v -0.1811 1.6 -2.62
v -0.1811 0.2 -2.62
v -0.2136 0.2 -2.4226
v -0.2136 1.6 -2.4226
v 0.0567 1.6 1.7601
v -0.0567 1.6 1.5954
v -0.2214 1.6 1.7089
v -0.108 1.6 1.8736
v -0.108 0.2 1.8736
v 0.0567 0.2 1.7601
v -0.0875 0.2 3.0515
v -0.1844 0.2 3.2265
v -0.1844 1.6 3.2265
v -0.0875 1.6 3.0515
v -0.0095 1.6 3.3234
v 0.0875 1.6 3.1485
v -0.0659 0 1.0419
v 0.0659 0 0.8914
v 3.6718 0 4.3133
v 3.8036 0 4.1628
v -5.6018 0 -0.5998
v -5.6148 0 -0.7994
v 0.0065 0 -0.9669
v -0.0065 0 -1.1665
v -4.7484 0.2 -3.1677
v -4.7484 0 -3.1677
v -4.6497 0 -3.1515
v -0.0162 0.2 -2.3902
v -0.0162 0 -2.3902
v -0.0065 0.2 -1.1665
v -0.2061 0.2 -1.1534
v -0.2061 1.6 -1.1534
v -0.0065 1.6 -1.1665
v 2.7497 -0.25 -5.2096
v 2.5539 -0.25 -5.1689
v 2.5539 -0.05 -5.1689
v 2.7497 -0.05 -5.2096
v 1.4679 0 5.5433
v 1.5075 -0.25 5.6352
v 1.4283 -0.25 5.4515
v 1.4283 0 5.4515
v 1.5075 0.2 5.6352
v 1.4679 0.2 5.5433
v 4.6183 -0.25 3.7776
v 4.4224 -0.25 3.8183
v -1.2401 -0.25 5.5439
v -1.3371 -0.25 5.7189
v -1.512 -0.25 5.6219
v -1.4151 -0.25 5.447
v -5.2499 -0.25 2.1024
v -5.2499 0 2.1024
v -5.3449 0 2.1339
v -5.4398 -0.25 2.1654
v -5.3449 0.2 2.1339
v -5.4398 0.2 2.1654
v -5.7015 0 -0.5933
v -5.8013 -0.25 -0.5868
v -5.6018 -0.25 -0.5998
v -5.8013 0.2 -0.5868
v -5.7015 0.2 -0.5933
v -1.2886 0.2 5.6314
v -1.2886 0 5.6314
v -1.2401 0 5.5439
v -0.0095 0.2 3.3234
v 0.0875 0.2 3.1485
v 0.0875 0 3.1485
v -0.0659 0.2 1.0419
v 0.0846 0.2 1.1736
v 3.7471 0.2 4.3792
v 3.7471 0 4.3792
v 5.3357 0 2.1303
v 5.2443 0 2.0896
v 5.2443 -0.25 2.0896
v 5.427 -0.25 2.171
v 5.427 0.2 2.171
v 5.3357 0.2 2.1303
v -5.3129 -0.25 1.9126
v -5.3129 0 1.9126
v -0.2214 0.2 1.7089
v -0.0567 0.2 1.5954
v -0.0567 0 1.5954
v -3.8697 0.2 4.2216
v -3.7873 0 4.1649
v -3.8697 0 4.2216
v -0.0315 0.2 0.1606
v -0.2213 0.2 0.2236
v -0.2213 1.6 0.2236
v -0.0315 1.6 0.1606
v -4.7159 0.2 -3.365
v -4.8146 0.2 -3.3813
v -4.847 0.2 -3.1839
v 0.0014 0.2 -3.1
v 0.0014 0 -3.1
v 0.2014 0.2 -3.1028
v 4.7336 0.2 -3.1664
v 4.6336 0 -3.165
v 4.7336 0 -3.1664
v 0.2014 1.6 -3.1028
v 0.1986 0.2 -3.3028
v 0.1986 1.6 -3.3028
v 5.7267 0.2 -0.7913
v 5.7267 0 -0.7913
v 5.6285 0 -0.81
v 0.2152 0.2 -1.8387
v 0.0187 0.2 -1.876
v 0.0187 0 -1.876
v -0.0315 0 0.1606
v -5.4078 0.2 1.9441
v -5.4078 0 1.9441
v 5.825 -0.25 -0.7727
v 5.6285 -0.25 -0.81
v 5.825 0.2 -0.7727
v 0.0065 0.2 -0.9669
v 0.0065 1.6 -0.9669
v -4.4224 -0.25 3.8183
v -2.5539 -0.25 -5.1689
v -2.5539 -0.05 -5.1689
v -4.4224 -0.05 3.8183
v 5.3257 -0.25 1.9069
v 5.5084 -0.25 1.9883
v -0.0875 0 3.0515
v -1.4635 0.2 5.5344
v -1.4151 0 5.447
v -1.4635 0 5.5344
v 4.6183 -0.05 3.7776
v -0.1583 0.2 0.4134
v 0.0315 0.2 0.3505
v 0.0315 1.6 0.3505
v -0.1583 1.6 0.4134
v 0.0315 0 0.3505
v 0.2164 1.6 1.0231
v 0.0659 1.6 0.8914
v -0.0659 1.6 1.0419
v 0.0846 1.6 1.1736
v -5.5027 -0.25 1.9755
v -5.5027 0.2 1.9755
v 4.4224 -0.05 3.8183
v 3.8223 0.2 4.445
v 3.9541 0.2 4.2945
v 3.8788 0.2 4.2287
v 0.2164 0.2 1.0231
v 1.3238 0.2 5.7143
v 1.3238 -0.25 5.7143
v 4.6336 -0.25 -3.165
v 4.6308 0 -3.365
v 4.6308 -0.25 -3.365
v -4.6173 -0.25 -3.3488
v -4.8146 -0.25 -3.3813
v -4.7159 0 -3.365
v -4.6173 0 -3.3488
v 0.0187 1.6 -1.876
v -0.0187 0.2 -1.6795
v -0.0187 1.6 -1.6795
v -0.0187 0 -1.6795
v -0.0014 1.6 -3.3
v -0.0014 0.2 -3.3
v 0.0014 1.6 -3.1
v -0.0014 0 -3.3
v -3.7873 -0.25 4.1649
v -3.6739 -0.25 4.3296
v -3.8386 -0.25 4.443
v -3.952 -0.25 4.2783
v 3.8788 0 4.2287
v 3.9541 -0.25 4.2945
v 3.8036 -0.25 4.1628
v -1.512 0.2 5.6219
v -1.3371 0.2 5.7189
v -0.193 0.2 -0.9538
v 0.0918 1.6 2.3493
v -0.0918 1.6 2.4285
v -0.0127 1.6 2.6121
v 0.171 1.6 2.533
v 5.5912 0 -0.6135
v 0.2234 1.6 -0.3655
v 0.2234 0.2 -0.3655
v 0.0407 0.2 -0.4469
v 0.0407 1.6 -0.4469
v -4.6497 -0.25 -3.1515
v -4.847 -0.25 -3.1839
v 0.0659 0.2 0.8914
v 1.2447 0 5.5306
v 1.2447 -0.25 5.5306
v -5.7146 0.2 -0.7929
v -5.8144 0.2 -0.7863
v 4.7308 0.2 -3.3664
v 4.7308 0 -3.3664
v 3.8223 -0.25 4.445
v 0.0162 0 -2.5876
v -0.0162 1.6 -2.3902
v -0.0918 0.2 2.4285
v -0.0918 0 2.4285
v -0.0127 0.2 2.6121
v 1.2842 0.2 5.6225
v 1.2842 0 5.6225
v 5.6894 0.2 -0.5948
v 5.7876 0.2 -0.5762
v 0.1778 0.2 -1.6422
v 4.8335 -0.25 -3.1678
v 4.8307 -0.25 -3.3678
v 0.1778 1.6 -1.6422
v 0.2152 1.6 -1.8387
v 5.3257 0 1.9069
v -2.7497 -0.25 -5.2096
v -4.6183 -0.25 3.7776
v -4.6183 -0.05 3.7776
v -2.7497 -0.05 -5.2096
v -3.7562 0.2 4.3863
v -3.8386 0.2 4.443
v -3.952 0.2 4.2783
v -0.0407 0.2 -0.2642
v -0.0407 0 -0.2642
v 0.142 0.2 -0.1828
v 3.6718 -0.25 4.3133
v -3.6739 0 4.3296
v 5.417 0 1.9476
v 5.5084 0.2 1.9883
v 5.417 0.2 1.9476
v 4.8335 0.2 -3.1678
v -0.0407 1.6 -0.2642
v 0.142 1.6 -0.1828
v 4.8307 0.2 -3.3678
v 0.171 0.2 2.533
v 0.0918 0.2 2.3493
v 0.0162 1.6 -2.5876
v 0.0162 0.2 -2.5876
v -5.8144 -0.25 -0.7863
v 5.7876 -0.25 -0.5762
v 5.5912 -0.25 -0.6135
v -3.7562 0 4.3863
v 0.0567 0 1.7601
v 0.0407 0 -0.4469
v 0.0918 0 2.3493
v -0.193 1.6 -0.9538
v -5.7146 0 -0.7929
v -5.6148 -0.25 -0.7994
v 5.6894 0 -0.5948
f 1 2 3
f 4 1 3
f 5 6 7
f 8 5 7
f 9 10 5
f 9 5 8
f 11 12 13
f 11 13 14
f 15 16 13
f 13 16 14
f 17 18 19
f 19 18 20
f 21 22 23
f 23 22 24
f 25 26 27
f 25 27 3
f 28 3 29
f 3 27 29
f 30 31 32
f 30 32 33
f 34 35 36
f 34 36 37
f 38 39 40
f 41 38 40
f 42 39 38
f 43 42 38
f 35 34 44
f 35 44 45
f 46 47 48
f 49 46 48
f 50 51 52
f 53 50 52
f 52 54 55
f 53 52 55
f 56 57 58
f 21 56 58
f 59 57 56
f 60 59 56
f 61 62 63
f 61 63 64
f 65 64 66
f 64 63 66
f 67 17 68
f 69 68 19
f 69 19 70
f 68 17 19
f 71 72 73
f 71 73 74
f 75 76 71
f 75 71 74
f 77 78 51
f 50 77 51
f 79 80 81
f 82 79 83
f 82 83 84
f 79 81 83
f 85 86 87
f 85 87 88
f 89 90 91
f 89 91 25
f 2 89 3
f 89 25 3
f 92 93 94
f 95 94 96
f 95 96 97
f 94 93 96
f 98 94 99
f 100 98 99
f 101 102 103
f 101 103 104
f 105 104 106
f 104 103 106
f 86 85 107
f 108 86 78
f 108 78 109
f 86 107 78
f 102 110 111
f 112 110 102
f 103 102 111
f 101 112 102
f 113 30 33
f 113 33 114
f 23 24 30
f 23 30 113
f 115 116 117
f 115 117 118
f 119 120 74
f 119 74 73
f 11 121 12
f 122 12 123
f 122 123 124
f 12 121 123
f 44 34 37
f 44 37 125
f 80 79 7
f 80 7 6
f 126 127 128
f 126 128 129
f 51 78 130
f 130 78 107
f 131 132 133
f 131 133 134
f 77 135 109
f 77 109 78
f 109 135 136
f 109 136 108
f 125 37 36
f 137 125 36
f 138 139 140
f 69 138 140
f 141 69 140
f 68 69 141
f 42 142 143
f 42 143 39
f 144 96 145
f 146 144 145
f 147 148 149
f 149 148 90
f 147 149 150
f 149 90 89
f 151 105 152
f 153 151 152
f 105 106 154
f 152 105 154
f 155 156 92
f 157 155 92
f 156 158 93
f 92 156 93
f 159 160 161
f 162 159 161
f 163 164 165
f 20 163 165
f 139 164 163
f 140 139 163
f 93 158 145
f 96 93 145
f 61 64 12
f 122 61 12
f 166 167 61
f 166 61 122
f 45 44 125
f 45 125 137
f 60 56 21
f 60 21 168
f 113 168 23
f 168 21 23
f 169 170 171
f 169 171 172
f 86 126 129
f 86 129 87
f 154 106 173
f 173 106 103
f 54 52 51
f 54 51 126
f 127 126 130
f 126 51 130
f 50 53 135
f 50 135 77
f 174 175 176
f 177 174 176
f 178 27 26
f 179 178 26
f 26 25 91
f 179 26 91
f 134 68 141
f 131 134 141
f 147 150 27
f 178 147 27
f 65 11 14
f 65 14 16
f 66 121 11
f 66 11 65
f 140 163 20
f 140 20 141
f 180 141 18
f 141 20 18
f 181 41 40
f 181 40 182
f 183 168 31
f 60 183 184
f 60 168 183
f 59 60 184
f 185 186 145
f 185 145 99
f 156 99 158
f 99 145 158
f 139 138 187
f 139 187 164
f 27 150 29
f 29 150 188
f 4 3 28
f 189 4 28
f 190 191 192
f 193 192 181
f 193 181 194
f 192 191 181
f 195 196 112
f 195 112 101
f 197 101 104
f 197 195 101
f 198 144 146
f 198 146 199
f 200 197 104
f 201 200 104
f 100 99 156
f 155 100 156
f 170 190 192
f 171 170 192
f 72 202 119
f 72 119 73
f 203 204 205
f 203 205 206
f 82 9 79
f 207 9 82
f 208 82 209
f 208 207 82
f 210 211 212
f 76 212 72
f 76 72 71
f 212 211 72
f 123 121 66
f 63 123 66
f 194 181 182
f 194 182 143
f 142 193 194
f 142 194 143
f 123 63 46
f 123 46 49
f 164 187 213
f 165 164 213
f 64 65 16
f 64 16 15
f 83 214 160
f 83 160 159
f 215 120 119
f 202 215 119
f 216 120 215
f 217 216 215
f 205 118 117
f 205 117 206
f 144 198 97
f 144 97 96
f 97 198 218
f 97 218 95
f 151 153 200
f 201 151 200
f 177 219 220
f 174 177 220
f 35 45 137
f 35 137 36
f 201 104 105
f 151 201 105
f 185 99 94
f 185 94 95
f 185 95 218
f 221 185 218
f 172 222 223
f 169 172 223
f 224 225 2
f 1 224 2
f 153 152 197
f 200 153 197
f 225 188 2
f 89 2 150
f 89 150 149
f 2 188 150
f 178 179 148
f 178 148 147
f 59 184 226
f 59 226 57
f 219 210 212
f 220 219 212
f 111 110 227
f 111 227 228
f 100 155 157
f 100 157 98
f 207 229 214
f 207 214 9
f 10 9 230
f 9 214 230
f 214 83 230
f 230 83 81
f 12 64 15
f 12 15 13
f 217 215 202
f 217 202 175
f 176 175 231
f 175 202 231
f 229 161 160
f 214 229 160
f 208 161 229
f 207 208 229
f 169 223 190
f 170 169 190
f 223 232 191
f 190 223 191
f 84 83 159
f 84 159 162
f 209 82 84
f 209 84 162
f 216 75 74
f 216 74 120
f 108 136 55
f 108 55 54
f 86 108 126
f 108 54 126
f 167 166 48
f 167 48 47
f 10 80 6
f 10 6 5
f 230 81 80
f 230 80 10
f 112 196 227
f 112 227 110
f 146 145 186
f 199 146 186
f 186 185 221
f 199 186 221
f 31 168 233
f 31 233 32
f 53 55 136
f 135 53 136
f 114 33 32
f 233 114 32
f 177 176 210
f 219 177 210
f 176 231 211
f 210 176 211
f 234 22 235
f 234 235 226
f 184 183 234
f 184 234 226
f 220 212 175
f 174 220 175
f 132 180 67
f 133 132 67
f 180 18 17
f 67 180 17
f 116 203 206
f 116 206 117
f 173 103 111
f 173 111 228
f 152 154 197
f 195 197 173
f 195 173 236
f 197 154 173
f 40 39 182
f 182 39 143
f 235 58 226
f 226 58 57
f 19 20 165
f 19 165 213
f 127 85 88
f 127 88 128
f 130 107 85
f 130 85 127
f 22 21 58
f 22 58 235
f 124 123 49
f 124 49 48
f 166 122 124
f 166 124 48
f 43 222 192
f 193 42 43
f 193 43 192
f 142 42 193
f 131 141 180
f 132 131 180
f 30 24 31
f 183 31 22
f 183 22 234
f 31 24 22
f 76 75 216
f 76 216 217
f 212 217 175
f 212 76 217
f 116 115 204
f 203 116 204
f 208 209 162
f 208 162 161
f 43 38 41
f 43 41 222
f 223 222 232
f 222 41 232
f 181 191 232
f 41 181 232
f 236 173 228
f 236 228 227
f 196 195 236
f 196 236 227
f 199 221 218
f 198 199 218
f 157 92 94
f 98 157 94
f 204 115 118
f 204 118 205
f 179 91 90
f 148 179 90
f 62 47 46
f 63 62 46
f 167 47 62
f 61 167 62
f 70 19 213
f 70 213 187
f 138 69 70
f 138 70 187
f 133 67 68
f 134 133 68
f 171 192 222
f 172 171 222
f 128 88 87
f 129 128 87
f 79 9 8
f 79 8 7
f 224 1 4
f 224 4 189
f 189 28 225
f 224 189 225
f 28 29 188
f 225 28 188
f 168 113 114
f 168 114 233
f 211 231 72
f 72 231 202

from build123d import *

# Parameters (mm, degrees)
EXTRUDE_THIN1_DEPTH    = 0.2
EXTRUDE_THIN1_2_DEPTH  = 0.2
EXTRUDE_THIN1_3_DEPTH  = 0.2
EXTRUDE_THIN1_4_DEPTH  = 0.2
EXTRUDE_THIN1_5_DEPTH  = 0.2
EXTRUDE_THIN1_6_DEPTH  = 0.2
EXTRUDE_THIN1_7_DEPTH  = 0.2
EXTRUDE_THIN1_8_DEPTH  = 0.2
EXTRUDE_THIN1_9_DEPTH  = 0.2
EXTRUDE_THIN1_10_DEPTH = 0.2
BOSS_EXTRUDE1_DEPTH    = 1.4
BOSS_EXTRUDE3_START    = -0.2
BOSS_EXTRUDE3_DEPTH    = 0.45
BOSS_EXTRUDE4_DEPTH    = 0.2
BOSS_EXTRUDE4_2_DEPTH  = 0.2


with BuildPart() as part:
    # Sketch2 → Extrude-Thin1 (new body)
    with BuildSketch(Plane(origin=(0, 0, 0), x_dir=(1, 0, 0), z_dir=(0, 1, 0))):
        Polygon((-0.03148464, -0.160641292), (-5.407828036, -1.944063837), (-5.344858755, -2.133892364), (0.03148464, -0.350469819), align=None)
    extrude(amount=EXTRUDE_THIN1_DEPTH)



with BuildPart() as body_2:
    # Sketch2 → Extrude-Thin1 2 (new body)
    with BuildSketch(Plane(origin=(0, 0, 0), x_dir=(1, 0, 0), z_dir=(0, 1, 0))):
        Polygon((0.001402442, 3.100009835), (4.733559671, 3.166382128), (4.730754787, 3.366362459), (-0.001402442, 3.299990165), align=None)
    extrude(amount=EXTRUDE_THIN1_2_DEPTH)


with BuildPart() as body_3:
    # Sketch2 → Extrude-Thin1 3 (new body)
    with BuildSketch(Plane(origin=(0, 0, 0), x_dir=(1, 0, 0), z_dir=(0, 1, 0))):
        Polygon((-0.056722562, -1.595421534), (-3.869677847, -4.221580558), (-3.756232723, -4.386293046), (0.056722562, -1.760134022), align=None)
    extrude(amount=EXTRUDE_THIN1_3_DEPTH)


with BuildPart() as body_4:
    # Sketch2 → Extrude-Thin1 4 (new body)
    with BuildSketch(Plane(origin=(0, 0, 0), x_dir=(1, 0, 0), z_dir=(0, 1, 0))):
        Polygon((-0.091839415, -2.428455564), (1.284225654, -5.622482125), (1.467904485, -5.543348775), (0.091839415, -2.349322214), align=None)
    extrude(amount=EXTRUDE_THIN1_4_DEPTH)


with BuildPart() as body_5:
    # Sketch2 → Extrude-Thin1 5 (new body)
    with BuildSketch(Plane(origin=(0, 0, 0), x_dir=(1, 0, 0), z_dir=(0, 1, 0))):
        Polygon((-0.01866868, 1.679535829), (5.689407347, 0.594843963), (5.726744706, 0.79132786), (0.01866868, 1.876019726), align=None)
    extrude(amount=EXTRUDE_THIN1_5_DEPTH)


with BuildPart() as body_6:
    # Sketch2 → Extrude-Thin1 6 (new body)
    with BuildSketch(Plane(origin=(0, 0, 0), x_dir=(1, 0, 0), z_dir=(0, 1, 0))):
        Polygon((-0.040685453, 0.264206259), (5.335657943, -2.130327397), (5.417028848, -1.947628804), (0.040685453, 0.446904852), align=None)
    extrude(amount=EXTRUDE_THIN1_6_DEPTH)


with BuildPart() as body_7:
    # Sketch2 → Extrude-Thin1 7 (new body)
    with BuildSketch(Plane(origin=(0, 0, 0), x_dir=(1, 0, 0), z_dir=(0, 1, 0))):
        Polygon((-0.065860903, -1.041915198), (3.747094382, -4.379185334), (3.878816188, -4.22868827), (0.065860903, -0.891418135), align=None)
    extrude(amount=EXTRUDE_THIN1_7_DEPTH)


with BuildPart() as body_8:
    # Sketch2 → Extrude-Thin1 8 (new body)
    with BuildSketch(Plane(origin=(0, 0, 0), x_dir=(1, 0, 0), z_dir=(0, 1, 0))):
        Polygon((-0.087465517, -3.051525436), (-1.463530587, -5.534440887), (-1.288599553, -5.631390014), (0.087465517, -3.148474564), align=None)
    extrude(amount=EXTRUDE_THIN1_8_DEPTH)


with BuildPart() as body_9:
    # Sketch2 → Extrude-Thin1 9 (new body)
    with BuildSketch(Plane(origin=(0, 0, 0), x_dir=(1, 0, 0), z_dir=(0, 1, 0))):
        Polygon((0.016212428, 2.587565924), (-4.715944801, 3.365049328), (-4.748369657, 3.167695259), (-0.016212428, 2.390211854), align=None)
    extrude(amount=EXTRUDE_THIN1_9_DEPTH)


with BuildPart() as body_10:
    # Sketch2 → Extrude-Thin1 10 (new body)
    with BuildSketch(Plane(origin=(0, 0, 0), x_dir=(1, 0, 0), z_dir=(0, 1, 0))):
        Polygon((-0.006530803, 1.166453182), (-5.714606829, 0.792872427), (-5.701545223, 0.593299396), (0.006530803, 0.966880152), align=None)
    extrude(amount=EXTRUDE_THIN1_10_DEPTH)


with BuildPart() as part_1:
    add(part.part)

    add(body_2.part)  # Boss-Extrude1 merges body 2

    add(body_3.part)  # Boss-Extrude1 merges body 3

    add(body_4.part)  # Boss-Extrude1 merges body 4

    add(body_5.part)  # Boss-Extrude1 merges body 5

    add(body_6.part)  # Boss-Extrude1 merges body 6

    add(body_7.part)  # Boss-Extrude1 merges body 7

    add(body_8.part)  # Boss-Extrude1 merges body 8

    add(body_9.part)  # Boss-Extrude1 merges body 9

    add(body_10.part)  # Boss-Extrude1 merges body 10
    # Sketch3 → Boss-Extrude1 (add)
    with BuildSketch(Plane(origin=(0, 0.2, 0), x_dir=(1, 0, 0), z_dir=(0, 1, 0))):
        Polygon((-0.001402442, 3.299990165), (0.001402442, 3.100009835), (0.201382773, 3.102814719), (0.198577888, 3.30279505), align=None)
        Polygon((0.016212428, 2.587565924), (-0.181141642, 2.619990779), (-0.213566497, 2.42263671), (-0.016212428, 2.390211854), align=None)
        Polygon((0.01866868, 1.876019726), (-0.01866868, 1.679535829), (0.177815217, 1.64219847), (0.215152576, 1.838682367), align=None)
        Polygon((-0.006530803, 1.166453182), (0.006530803, 0.966880152), (-0.193042227, 0.953818545), (-0.206103834, 1.153391575), align=None)
        Polygon((0.040685453, 0.446904852), (-0.040685453, 0.264206259), (0.14201314, 0.182835354), (0.223384045, 0.365533947), align=None)
        Polygon((-0.03148464, -0.160641292), (0.03148464, -0.350469819), (-0.158343887, -0.4134391), (-0.221313167, -0.223610572), align=None)
        Polygon((0.065860903, -0.891418135), (-0.065860903, -1.041915198), (0.08463616, -1.173637004), (0.216357966, -1.023139941), align=None)
        Polygon((-0.056722562, -1.595421534), (0.056722562, -1.760134022), (-0.107989926, -1.873579146), (-0.22143505, -1.708866658), align=None)
        Polygon((0.091839415, -2.349322214), (-0.091839415, -2.428455564), (-0.012706065, -2.612134395), (0.170972766, -2.533001044), align=None)
        Polygon((-0.087465517, -3.051525436), (0.087465517, -3.148474564), (-0.00948361, -3.323405598), (-0.184414644, -3.226456471), align=None)
    extrude(amount=BOSS_EXTRUDE1_DEPTH)

    # Sketch4 → Boss-Extrude3 (add)
    with BuildSketch(Plane.XZ.offset(BOSS_EXTRUDE3_START)):
        Polygon((4.633569506, -3.164979686), (4.630764621, -3.364960017), (4.830744952, -3.367764901), (4.833549836, -3.167784571), align=None)
        Polygon((5.787649295, -0.576175284), (5.824986654, -0.77265918), (5.628502757, -0.809996539), (5.591165398, -0.613512643), align=None)
        Polygon((5.427007239, 2.171012849), (5.508378144, 1.988314257), (5.325679552, 1.906943352), (5.244308646, 2.089641944), align=None)
        Polygon((3.822342914, 4.445046236), (3.954064719, 4.294549173), (3.803567656, 4.162827368), (3.671845851, 4.313324431), align=None)
        Polygon((1.323792329, 5.714321541), (1.50747116, 5.63518819), (1.42833781, 5.45150936), (1.244658979, 5.53064271), align=None)
        Polygon((-1.51200515, 5.621906404), (-1.337074116, 5.718855531), (-1.240124989, 5.543924497), (-1.415056023, 5.446975369), align=None)
        Polygon((-3.952034091, 4.27830312), (-3.838588967, 4.443015608), (-3.673876479, 4.329570484), (-3.787321603, 4.164857996), align=None)
        Polygon((-5.439773019, 2.165377004), (-5.502742299, 1.975548477), (-5.312913772, 1.912579197), (-5.249944492, 2.102407724), align=None)
        Polygon((-5.814393345, -0.786341623), (-5.801331738, -0.586768593), (-5.601758708, -0.5998302), (-5.614820314, -0.79940323), align=None)
        Polygon((-4.847046691, -3.183907687), (-4.814621836, -3.381261756), (-4.617267766, -3.348836901), (-4.649692622, -3.151482831), align=None)
    extrude(amount=BOSS_EXTRUDE3_DEPTH)


with BuildPart() as body_2_2:
    # Sketch5 → Boss-Extrude4 (new body)
    with BuildSketch(Plane(origin=(0, -0.25, 0), x_dir=(1, 0, 0), z_dir=(0, 1, 0))):
        Polygon((4.422449747, -3.818262244), (2.553895996, 5.168922401), (2.749708492, 5.209634391), (4.618262244, -3.777550253), align=None)
    extrude(amount=BOSS_EXTRUDE4_DEPTH)


with BuildPart() as body_3_2:
    # Sketch5 → Boss-Extrude4 2 (new body)
    with BuildSketch(Plane(origin=(0, -0.25, 0), x_dir=(1, 0, 0), z_dir=(0, 1, 0))):
        Polygon((-4.618262244, -3.777550253), (-2.749708492, 5.209634391), (-2.553895996, 5.168922401), (-4.422449747, -3.818262244), align=None)
    extrude(amount=BOSS_EXTRUDE4_2_DEPTH)


solid = Compound([part_1.part, body_2_2.part, body_3_2.part])
